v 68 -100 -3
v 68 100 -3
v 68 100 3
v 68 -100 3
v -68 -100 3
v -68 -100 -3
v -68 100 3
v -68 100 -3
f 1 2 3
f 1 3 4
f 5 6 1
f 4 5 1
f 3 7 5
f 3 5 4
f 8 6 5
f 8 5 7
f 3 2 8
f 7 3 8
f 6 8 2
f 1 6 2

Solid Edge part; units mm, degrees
sketch "Sketch1" plane through (0, 0, 0) normal (0, 0, 1) x (1, 0, 0)
  line L0 (-100, -100) -> (100, -100)
  line L1 (100, -100) -> (100, 100)
  line L2 (100, 100) -> (-100, 100)
  line L3 (-100, 100) -> (-100, -100)
  dimension "D1" = 200
  dimension "D2" = 200
extrude "Protrusion1" add sketch "Sketch1" along normal mid plane 6
sketch "Sketch2" plane through (0, 0, -3) normal (0, 0, -1) x (1, 0, 0)
  line L0 (-68, 112.9) -> (-68, 86.9)
extrude "Cutout1" cut sketch "Sketch2" against normal through all material side at (-68.05, -99.9, -3)
mirror "Mirror1" about plane through (0, 0, 0) normal (1, 0, 0) of "Cutout1"
